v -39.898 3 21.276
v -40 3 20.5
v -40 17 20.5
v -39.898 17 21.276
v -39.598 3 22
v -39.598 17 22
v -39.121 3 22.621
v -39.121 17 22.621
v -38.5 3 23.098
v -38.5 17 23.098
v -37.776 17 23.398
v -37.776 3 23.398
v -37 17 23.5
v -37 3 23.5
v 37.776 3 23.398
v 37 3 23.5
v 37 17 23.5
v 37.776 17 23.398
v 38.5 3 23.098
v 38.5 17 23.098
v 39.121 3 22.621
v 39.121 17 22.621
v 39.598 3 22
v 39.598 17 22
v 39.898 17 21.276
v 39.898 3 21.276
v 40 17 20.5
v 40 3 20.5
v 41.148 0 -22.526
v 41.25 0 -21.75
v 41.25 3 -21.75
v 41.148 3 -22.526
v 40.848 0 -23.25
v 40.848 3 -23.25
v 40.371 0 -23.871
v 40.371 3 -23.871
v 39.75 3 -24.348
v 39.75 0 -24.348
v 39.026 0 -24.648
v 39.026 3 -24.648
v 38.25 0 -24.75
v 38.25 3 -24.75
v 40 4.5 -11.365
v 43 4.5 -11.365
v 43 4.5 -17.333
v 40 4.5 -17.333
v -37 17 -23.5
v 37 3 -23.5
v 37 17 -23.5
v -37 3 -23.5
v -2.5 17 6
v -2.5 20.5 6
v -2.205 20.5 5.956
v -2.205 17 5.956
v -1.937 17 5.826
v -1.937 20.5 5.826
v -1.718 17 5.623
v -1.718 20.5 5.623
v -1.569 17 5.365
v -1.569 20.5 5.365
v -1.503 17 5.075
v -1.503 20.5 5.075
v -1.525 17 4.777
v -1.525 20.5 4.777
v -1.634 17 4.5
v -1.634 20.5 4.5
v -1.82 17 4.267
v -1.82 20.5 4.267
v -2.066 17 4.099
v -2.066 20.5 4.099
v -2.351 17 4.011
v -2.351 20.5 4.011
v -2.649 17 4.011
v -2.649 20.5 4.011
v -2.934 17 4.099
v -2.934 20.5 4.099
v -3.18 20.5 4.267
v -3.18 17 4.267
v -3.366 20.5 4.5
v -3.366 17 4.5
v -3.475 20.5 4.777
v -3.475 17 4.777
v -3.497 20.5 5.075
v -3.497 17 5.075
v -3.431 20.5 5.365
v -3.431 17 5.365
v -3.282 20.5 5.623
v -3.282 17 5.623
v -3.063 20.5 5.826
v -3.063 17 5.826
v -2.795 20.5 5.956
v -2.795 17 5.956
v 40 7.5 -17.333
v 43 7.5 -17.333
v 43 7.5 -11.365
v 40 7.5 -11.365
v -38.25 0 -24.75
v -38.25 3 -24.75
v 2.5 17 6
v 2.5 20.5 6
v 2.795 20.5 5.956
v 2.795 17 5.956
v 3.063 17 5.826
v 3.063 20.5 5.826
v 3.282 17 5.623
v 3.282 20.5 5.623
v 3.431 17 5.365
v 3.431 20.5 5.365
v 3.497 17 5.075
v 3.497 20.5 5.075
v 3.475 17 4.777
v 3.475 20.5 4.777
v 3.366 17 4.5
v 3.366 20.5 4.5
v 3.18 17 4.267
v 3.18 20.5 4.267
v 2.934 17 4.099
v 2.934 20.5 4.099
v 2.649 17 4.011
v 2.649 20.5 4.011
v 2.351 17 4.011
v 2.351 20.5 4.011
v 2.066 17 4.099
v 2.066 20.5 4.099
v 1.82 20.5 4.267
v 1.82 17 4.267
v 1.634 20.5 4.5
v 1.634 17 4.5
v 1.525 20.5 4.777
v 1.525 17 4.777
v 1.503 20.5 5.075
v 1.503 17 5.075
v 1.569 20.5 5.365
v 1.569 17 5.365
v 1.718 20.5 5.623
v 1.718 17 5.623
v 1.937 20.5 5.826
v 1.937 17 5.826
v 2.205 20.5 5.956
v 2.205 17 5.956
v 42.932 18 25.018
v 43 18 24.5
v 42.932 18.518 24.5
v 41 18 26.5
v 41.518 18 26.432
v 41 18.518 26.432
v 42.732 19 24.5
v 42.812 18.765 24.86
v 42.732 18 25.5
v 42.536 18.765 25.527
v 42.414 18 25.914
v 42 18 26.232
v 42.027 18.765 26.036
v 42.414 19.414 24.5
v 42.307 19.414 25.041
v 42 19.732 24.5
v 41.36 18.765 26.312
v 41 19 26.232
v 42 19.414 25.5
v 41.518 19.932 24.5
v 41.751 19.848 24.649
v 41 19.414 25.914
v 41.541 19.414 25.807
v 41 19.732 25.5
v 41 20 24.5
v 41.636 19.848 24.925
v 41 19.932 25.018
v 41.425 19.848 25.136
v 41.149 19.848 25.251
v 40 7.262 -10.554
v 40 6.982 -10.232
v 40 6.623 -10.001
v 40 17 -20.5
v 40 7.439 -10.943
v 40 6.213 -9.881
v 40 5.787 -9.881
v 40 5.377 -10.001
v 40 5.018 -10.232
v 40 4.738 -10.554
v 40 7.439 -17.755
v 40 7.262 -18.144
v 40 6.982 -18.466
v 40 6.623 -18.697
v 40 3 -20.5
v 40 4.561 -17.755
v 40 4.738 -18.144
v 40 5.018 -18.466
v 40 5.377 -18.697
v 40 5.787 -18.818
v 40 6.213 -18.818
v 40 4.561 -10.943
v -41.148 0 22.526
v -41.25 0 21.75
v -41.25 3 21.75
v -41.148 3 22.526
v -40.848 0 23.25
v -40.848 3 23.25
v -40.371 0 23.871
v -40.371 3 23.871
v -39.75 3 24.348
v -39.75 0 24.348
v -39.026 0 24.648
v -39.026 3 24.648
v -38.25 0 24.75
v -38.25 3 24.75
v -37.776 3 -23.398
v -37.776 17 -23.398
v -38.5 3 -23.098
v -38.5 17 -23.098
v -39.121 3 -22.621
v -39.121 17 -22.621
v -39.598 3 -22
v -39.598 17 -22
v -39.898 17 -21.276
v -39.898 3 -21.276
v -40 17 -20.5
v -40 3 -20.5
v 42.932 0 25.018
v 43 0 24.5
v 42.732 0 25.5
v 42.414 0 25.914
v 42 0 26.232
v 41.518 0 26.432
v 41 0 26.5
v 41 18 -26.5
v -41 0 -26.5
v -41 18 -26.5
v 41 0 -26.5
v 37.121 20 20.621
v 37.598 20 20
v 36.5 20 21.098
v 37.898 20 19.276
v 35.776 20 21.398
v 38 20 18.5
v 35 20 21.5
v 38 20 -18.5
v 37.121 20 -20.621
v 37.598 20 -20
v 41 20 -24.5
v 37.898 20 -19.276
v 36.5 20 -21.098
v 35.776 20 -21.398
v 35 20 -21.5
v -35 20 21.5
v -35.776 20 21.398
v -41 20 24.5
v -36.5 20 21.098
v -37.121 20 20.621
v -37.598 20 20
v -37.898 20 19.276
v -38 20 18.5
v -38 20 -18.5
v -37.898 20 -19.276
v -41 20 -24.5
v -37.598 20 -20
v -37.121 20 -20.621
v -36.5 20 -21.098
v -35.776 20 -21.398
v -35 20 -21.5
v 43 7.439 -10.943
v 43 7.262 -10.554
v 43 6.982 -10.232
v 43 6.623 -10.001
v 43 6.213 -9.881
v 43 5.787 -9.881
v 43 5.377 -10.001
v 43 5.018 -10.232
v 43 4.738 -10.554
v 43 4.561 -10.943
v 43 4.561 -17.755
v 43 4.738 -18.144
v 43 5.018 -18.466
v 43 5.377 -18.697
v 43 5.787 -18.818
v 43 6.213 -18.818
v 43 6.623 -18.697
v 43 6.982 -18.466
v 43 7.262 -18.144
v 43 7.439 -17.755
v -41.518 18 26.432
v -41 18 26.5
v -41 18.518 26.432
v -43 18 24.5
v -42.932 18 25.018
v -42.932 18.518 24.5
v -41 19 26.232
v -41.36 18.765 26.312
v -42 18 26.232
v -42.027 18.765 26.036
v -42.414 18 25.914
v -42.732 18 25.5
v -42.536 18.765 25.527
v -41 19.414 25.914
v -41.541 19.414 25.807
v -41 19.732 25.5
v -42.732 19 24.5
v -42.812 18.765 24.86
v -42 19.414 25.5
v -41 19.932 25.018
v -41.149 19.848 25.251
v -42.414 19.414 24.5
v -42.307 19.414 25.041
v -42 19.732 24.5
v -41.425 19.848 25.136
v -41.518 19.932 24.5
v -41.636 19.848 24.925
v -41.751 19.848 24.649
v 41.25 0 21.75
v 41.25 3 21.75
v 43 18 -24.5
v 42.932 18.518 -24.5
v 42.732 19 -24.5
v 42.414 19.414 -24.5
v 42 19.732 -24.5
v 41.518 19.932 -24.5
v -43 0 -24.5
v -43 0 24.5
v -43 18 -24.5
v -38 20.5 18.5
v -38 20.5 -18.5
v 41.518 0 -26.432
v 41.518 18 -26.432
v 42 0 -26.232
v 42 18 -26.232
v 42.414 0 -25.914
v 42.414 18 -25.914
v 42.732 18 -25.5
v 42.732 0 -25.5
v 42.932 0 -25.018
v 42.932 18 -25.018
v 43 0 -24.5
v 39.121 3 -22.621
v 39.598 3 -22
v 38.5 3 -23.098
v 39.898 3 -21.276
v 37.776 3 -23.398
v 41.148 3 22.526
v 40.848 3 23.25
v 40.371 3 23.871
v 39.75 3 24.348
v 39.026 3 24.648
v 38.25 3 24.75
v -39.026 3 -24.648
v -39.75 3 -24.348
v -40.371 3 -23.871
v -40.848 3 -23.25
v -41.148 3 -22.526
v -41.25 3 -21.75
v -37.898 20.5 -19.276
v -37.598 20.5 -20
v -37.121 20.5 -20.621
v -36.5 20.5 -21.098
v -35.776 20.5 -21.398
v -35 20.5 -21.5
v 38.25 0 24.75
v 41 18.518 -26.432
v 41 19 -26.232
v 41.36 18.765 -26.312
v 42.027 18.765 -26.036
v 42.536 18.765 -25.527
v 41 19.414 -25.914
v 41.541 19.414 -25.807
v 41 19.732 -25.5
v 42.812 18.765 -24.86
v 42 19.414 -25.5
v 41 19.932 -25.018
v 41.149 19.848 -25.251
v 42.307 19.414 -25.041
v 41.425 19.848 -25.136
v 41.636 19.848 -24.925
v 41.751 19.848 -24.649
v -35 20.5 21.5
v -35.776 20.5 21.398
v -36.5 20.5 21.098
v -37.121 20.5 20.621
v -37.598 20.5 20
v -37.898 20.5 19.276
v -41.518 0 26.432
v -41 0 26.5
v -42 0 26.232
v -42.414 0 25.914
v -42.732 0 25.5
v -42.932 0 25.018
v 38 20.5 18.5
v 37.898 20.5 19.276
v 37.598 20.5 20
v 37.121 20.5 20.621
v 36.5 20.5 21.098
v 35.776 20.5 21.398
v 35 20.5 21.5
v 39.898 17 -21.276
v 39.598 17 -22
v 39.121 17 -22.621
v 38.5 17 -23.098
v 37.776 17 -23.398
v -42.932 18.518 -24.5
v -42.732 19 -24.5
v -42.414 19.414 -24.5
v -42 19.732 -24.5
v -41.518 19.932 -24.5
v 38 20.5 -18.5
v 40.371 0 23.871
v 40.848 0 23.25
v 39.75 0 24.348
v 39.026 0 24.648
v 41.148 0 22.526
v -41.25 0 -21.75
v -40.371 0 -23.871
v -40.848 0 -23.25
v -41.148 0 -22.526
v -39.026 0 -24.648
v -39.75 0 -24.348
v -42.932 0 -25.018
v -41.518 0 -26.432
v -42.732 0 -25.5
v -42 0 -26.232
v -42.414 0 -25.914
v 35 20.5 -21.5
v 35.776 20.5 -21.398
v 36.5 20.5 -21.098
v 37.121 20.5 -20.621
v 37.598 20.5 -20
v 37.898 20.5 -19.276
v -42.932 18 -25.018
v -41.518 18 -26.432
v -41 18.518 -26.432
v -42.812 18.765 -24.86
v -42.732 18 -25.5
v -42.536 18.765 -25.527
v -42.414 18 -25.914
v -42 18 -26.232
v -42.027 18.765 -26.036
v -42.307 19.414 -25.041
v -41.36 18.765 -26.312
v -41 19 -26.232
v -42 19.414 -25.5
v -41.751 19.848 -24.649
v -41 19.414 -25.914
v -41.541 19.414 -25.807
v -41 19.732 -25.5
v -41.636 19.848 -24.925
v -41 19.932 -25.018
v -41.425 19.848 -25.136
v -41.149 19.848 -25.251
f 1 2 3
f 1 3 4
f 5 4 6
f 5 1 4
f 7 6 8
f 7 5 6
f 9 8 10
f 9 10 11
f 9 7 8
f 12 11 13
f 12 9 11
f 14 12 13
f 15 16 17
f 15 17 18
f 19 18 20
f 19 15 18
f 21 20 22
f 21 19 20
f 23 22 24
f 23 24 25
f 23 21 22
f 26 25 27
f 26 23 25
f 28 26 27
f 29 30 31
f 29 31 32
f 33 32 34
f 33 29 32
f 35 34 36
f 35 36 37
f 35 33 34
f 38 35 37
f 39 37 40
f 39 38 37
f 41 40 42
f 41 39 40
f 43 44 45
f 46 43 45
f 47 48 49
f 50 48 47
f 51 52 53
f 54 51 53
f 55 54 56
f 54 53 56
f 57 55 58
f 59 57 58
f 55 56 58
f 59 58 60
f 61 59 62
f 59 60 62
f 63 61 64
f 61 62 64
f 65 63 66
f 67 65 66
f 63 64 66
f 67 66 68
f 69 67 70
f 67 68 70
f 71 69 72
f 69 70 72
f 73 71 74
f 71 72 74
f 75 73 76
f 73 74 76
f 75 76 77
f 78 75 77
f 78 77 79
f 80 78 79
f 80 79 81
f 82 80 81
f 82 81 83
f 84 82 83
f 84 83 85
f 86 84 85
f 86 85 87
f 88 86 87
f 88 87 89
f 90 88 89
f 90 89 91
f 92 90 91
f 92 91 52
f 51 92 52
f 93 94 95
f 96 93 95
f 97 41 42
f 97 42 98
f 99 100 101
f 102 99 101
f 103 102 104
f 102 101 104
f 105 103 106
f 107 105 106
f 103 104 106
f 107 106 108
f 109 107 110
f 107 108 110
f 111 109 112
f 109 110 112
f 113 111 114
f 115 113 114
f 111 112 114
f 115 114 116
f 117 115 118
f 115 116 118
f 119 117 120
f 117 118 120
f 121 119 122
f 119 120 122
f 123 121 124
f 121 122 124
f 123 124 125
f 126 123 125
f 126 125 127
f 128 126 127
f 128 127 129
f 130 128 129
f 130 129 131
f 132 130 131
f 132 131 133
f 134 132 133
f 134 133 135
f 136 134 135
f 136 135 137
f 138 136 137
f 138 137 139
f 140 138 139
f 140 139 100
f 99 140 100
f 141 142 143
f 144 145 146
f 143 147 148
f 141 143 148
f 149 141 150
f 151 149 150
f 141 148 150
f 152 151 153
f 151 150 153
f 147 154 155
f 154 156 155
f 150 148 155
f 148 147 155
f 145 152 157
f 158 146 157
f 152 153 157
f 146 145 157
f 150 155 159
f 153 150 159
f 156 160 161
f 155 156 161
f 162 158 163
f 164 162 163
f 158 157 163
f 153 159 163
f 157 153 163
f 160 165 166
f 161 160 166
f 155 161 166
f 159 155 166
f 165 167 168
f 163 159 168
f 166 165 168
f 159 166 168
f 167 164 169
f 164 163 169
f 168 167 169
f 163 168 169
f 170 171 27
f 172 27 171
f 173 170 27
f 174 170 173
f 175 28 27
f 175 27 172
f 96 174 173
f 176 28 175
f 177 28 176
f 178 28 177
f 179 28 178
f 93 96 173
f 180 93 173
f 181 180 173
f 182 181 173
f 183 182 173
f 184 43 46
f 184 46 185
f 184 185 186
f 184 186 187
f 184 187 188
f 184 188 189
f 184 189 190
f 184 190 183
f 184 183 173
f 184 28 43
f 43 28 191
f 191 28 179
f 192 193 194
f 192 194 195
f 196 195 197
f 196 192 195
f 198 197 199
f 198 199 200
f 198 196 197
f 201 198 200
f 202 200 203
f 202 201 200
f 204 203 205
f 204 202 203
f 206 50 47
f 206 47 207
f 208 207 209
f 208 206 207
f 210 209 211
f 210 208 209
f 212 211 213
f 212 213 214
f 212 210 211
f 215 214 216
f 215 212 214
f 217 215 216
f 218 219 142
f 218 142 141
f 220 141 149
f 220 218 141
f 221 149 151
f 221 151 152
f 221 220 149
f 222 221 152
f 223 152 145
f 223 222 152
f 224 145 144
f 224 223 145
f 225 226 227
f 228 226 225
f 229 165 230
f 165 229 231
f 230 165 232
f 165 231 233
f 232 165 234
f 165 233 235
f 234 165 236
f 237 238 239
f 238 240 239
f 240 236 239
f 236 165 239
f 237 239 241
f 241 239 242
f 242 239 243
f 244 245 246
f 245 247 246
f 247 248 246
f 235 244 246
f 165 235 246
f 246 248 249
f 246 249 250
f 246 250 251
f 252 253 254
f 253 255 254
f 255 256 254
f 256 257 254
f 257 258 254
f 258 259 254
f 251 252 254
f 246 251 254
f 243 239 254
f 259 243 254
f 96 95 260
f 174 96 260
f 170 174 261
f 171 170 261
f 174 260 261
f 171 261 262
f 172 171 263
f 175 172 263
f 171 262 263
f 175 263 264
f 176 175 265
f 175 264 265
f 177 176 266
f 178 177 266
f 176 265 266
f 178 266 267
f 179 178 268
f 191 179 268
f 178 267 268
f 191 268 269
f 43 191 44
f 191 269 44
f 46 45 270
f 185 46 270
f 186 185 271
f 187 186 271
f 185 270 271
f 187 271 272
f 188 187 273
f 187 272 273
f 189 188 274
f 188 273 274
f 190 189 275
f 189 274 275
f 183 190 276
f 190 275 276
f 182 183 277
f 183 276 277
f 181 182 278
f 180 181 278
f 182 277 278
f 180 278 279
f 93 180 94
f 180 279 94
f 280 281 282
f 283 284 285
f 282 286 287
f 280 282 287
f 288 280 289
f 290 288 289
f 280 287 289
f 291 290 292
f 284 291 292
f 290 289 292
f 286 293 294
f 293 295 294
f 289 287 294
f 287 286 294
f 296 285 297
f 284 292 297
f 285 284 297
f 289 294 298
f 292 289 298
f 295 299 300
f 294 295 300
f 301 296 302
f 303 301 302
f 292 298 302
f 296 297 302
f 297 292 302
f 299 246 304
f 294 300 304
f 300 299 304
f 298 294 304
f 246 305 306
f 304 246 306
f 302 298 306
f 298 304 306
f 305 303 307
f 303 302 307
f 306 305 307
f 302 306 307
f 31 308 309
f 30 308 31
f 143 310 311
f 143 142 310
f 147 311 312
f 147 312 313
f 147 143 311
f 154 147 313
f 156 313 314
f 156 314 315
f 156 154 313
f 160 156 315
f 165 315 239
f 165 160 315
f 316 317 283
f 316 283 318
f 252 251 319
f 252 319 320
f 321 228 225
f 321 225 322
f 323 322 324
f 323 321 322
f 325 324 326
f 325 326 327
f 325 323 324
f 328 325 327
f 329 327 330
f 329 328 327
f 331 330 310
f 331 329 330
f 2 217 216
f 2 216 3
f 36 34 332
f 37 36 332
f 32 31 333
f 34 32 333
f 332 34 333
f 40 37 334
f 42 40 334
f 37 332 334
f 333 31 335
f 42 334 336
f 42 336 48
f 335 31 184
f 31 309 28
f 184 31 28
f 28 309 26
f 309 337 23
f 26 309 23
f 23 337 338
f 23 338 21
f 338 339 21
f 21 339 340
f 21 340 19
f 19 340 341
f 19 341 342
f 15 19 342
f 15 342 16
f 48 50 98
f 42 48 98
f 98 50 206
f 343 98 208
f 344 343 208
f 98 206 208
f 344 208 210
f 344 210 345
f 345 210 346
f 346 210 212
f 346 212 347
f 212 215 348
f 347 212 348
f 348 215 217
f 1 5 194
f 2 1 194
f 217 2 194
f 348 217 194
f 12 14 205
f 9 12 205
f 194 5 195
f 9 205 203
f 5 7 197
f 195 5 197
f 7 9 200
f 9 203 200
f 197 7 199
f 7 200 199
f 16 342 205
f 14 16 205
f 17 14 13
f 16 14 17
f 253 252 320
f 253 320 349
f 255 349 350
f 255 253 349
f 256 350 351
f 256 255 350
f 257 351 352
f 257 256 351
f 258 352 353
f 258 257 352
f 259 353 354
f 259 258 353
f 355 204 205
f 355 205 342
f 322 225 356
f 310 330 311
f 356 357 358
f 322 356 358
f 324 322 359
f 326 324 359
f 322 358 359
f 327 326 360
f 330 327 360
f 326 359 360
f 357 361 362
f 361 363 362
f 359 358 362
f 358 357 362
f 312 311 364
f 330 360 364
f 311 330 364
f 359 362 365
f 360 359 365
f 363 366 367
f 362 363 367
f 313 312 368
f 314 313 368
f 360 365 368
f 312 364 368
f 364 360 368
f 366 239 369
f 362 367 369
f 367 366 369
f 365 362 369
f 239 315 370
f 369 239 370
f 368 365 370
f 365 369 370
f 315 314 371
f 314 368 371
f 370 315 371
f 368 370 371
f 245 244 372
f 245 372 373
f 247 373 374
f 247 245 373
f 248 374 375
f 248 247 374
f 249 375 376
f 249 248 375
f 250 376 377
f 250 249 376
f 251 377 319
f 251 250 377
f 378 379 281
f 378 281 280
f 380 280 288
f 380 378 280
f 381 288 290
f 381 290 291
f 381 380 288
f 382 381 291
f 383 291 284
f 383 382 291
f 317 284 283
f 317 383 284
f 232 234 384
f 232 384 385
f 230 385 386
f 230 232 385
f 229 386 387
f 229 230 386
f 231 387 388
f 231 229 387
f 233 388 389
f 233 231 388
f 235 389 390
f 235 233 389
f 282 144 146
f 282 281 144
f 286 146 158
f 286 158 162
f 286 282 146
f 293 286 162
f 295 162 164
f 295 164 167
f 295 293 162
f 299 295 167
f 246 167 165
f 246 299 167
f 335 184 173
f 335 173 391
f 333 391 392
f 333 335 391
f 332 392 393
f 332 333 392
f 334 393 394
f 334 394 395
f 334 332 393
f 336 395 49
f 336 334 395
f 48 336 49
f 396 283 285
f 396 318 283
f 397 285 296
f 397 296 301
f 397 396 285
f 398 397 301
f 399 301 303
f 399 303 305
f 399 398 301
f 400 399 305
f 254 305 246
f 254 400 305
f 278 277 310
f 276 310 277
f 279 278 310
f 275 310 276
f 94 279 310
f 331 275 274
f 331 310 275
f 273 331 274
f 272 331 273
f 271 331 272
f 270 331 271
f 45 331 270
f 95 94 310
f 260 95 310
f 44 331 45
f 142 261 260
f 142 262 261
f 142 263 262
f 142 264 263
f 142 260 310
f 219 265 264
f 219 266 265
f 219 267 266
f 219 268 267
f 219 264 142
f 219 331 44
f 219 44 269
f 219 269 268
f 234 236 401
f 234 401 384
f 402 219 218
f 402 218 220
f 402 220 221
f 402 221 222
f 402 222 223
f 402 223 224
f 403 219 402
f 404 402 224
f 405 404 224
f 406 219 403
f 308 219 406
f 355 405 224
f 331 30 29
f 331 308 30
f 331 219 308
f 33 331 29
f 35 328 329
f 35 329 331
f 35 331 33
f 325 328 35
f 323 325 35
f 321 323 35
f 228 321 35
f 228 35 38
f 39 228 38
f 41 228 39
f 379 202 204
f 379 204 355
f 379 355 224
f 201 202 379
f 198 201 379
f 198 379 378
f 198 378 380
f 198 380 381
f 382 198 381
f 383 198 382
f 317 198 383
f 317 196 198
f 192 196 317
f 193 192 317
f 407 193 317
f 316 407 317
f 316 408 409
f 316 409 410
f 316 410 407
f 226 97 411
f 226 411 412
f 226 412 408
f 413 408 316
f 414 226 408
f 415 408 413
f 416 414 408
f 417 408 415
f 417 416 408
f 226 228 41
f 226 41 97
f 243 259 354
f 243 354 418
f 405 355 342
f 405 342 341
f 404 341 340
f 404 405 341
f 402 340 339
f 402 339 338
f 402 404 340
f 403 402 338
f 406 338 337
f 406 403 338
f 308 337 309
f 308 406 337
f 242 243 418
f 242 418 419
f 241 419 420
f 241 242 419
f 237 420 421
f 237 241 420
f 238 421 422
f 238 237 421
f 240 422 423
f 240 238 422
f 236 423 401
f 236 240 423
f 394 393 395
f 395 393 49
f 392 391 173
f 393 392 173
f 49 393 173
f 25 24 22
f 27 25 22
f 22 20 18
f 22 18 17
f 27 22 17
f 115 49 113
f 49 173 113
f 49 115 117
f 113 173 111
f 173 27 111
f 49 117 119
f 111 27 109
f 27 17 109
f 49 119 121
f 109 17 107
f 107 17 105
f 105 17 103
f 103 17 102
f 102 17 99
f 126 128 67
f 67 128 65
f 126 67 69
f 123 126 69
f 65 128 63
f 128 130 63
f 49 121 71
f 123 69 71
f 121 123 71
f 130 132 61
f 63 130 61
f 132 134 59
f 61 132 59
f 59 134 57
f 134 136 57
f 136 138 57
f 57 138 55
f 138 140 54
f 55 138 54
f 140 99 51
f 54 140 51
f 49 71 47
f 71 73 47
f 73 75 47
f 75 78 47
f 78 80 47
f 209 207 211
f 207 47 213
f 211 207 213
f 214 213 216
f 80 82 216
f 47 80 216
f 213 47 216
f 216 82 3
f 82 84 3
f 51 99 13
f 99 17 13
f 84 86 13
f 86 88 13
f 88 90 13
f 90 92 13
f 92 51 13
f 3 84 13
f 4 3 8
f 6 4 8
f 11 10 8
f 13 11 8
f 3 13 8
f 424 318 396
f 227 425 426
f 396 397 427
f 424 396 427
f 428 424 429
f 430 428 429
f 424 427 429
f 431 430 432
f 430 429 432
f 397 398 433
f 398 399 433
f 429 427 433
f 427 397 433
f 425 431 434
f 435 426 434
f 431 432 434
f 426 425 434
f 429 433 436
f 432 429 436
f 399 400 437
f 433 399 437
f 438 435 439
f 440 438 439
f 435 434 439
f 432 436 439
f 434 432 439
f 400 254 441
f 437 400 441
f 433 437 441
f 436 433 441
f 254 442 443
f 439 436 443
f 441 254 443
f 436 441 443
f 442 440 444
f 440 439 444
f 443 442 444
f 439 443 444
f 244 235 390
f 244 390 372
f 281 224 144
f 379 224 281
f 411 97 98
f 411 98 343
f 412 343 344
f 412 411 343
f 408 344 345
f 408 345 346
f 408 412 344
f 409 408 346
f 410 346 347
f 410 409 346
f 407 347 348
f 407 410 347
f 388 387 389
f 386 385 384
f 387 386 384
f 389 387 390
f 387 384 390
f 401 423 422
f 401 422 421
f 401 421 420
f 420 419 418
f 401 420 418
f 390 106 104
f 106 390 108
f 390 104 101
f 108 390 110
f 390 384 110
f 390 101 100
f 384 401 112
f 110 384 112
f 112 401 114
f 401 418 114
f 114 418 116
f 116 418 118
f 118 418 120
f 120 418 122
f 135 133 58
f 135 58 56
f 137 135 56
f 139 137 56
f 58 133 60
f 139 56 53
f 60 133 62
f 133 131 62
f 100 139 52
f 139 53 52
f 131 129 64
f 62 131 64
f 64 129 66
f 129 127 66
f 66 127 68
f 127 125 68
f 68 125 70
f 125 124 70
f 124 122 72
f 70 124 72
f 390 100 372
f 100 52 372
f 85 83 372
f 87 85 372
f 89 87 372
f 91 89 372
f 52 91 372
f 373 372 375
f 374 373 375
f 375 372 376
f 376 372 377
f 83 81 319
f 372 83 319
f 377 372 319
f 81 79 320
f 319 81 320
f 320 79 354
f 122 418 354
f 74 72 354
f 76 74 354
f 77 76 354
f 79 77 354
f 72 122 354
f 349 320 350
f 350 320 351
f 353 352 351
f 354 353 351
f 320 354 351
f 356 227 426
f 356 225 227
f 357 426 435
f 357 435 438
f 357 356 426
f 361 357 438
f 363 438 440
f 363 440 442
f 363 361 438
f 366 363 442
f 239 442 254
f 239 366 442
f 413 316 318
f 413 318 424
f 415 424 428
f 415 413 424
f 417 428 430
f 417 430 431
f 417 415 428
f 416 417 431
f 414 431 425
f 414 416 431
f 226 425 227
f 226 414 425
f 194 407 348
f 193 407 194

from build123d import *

# Parameters (mm, degrees)
BOSS_EXTRUDE1_DEPTH = 20
FILLET1_R           = 2
BOSS_EXTRUDE2_DEPTH = 0.5
CUT_EXTRUDE1_DEPTH  = 17
CUT_EXTRUDE2_DEPTH  = 3
SKETCH5_R           = 1
CUT_EXTRUDE3_DEPTH  = 10
SKETCH6_R           = 1.5
CUT_EXTRUDE4_DEPTH  = 10


with BuildPart() as part:
    # Sketch1 → Boss-Extrude1 (new body)
    with BuildSketch(Plane(origin=(0, 0, 0), x_dir=(1, 0, 0), z_dir=(0, 1, 0))):
        with BuildLine():
            Line((-41, 26.5), (41, 26.5))
            ThreePointArc((41, 26.5), (42.414213562, 25.914213562), (43, 24.5))
            Line((43, 24.5), (43, -24.5))
            ThreePointArc((43, -24.5), (42.414213562, -25.914213562), (41, -26.5))
            Line((41, -26.5), (-41, -26.5))
            ThreePointArc((-41, -26.5), (-42.414213562, -25.914213562), (-43, -24.5))
            Line((-43, -24.5), (-43, 24.5))
            ThreePointArc((-43, 24.5), (-42.414213562, 25.914213562), (-41, 26.5))
        make_face()
    extrude(amount=BOSS_EXTRUDE1_DEPTH)

    # Fillet1
    fillet1_edges = [part.edges().sort_by_distance(p)[0] for p in [
        (-42.414213562, 20, -25.914213562),
        (-43, 20, 0),
        (-42.414213562, 20, 25.914213562),
        (0, 20, 26.5),
        (42.414213562, 20, 25.914213562),
        (43, 20, 0),
        (42.414213562, 20, -25.914213562),
        (0, 20, -26.5),
    ]]
    fillet(fillet1_edges, radius=FILLET1_R)

    # Sketch2 → Boss-Extrude2 (add)
    with BuildSketch(Plane(origin=(0, 20, 0), x_dir=(1, 0, 0), z_dir=(0, 1, 0))):
        with BuildLine():
            Line((-35, 21.5), (35, 21.5))
            ThreePointArc((35, 21.5), (37.121320344, 20.621320344), (38, 18.5))
            Line((38, 18.5), (38, -18.5))
            ThreePointArc((38, -18.5), (37.121320344, -20.621320344), (35, -21.5))
            Line((35, -21.5), (-35, -21.5))
            ThreePointArc((-35, -21.5), (-37.121320344, -20.621320344), (-38, -18.5))
            Line((-38, -18.5), (-38, 18.5))
            ThreePointArc((-38, 18.5), (-37.121320344, 20.621320344), (-35, 21.5))
        make_face()
    extrude(amount=BOSS_EXTRUDE2_DEPTH)

    # Sketch3 → Cut-Extrude1 (cut)
    with BuildSketch(Plane.XZ):
        with BuildLine():
            Line((-37, 23.5), (37, 23.5))
            ThreePointArc((37, 23.5), (39.121320344, 22.621320344), (40, 20.5))
            Line((40, 20.5), (40, -20.5))
            ThreePointArc((40, -20.5), (39.121320344, -22.621320344), (37, -23.5))
            Line((37, -23.5), (-37, -23.5))
            ThreePointArc((-37, -23.5), (-39.121320344, -22.621320344), (-40, -20.5))
            Line((-40, -20.5), (-40, 20.5))
            ThreePointArc((-40, 20.5), (-39.121320344, 22.621320344), (-37, 23.5))
        make_face()
    extrude(amount=-CUT_EXTRUDE1_DEPTH, mode=Mode.SUBTRACT)

    # Sketch4 → Cut-Extrude2 (cut)
    with BuildSketch(Plane.XZ):
        with BuildLine():
            Line((38.25, -24.75), (-38.25, -24.75))
            ThreePointArc((-38.25, -24.75), (-40.371320344, -23.871320344), (-41.25, -21.75))
            Line((-41.25, -21.75), (-41.25, 21.75))
            ThreePointArc((-41.25, 21.75), (-40.371320344, 23.871320344), (-38.25, 24.75))
            Line((-38.25, 24.75), (38.25, 24.75))
            ThreePointArc((38.25, 24.75), (40.371320344, 23.871320344), (41.25, 21.75))
            Line((41.25, 21.75), (41.25, -21.75))
            ThreePointArc((41.25, -21.75), (40.371320344, -23.871320344), (38.25, -24.75))
        make_face()
    extrude(amount=-CUT_EXTRUDE2_DEPTH, mode=Mode.SUBTRACT)

    # Sketch5 → Cut-Extrude3 (cut)
    with BuildSketch(Plane(origin=(0, 20.5, 0), x_dir=(1, 0, 0), z_dir=(0, 1, 0))):
        with Locations(Location((-2.5, -5, 0), (0, 0, 270))):
            Circle(SKETCH5_R)
        with Locations(Location((2.5, -5, 0), (0, 0, 270))):
            Circle(SKETCH5_R)
    extrude(amount=-CUT_EXTRUDE3_DEPTH, mode=Mode.SUBTRACT)

    # Sketch6 → Cut-Extrude4 (cut)
    with BuildSketch(Plane(origin=(43, 0, 0), x_dir=(0, 0, -1), z_dir=(1, 0, 0))):
        with Locations((11.365424158, 6)):
            Circle(SKETCH6_R)
        with BuildLine():
            Line((17.332844904, 7.5), (11.365424158, 7.5))
            ThreePointArc((11.365424158, 7.5), (12.426084329, 7.060660172), (12.865424158, 6))
            ThreePointArc((12.865424158, 6), (12.426084329, 4.939339828), (11.365424158, 4.5))
            Line((11.365424158, 4.5), (17.332844904, 4.5))
            ThreePointArc((17.332844904, 4.5), (15.832844904, 6), (17.332844904, 7.5))
        make_face()
        with Locations((17.332844904, 6)):
            Circle(SKETCH6_R)
    extrude(amount=-CUT_EXTRUDE4_DEPTH, mode=Mode.SUBTRACT)


solid = part.part
